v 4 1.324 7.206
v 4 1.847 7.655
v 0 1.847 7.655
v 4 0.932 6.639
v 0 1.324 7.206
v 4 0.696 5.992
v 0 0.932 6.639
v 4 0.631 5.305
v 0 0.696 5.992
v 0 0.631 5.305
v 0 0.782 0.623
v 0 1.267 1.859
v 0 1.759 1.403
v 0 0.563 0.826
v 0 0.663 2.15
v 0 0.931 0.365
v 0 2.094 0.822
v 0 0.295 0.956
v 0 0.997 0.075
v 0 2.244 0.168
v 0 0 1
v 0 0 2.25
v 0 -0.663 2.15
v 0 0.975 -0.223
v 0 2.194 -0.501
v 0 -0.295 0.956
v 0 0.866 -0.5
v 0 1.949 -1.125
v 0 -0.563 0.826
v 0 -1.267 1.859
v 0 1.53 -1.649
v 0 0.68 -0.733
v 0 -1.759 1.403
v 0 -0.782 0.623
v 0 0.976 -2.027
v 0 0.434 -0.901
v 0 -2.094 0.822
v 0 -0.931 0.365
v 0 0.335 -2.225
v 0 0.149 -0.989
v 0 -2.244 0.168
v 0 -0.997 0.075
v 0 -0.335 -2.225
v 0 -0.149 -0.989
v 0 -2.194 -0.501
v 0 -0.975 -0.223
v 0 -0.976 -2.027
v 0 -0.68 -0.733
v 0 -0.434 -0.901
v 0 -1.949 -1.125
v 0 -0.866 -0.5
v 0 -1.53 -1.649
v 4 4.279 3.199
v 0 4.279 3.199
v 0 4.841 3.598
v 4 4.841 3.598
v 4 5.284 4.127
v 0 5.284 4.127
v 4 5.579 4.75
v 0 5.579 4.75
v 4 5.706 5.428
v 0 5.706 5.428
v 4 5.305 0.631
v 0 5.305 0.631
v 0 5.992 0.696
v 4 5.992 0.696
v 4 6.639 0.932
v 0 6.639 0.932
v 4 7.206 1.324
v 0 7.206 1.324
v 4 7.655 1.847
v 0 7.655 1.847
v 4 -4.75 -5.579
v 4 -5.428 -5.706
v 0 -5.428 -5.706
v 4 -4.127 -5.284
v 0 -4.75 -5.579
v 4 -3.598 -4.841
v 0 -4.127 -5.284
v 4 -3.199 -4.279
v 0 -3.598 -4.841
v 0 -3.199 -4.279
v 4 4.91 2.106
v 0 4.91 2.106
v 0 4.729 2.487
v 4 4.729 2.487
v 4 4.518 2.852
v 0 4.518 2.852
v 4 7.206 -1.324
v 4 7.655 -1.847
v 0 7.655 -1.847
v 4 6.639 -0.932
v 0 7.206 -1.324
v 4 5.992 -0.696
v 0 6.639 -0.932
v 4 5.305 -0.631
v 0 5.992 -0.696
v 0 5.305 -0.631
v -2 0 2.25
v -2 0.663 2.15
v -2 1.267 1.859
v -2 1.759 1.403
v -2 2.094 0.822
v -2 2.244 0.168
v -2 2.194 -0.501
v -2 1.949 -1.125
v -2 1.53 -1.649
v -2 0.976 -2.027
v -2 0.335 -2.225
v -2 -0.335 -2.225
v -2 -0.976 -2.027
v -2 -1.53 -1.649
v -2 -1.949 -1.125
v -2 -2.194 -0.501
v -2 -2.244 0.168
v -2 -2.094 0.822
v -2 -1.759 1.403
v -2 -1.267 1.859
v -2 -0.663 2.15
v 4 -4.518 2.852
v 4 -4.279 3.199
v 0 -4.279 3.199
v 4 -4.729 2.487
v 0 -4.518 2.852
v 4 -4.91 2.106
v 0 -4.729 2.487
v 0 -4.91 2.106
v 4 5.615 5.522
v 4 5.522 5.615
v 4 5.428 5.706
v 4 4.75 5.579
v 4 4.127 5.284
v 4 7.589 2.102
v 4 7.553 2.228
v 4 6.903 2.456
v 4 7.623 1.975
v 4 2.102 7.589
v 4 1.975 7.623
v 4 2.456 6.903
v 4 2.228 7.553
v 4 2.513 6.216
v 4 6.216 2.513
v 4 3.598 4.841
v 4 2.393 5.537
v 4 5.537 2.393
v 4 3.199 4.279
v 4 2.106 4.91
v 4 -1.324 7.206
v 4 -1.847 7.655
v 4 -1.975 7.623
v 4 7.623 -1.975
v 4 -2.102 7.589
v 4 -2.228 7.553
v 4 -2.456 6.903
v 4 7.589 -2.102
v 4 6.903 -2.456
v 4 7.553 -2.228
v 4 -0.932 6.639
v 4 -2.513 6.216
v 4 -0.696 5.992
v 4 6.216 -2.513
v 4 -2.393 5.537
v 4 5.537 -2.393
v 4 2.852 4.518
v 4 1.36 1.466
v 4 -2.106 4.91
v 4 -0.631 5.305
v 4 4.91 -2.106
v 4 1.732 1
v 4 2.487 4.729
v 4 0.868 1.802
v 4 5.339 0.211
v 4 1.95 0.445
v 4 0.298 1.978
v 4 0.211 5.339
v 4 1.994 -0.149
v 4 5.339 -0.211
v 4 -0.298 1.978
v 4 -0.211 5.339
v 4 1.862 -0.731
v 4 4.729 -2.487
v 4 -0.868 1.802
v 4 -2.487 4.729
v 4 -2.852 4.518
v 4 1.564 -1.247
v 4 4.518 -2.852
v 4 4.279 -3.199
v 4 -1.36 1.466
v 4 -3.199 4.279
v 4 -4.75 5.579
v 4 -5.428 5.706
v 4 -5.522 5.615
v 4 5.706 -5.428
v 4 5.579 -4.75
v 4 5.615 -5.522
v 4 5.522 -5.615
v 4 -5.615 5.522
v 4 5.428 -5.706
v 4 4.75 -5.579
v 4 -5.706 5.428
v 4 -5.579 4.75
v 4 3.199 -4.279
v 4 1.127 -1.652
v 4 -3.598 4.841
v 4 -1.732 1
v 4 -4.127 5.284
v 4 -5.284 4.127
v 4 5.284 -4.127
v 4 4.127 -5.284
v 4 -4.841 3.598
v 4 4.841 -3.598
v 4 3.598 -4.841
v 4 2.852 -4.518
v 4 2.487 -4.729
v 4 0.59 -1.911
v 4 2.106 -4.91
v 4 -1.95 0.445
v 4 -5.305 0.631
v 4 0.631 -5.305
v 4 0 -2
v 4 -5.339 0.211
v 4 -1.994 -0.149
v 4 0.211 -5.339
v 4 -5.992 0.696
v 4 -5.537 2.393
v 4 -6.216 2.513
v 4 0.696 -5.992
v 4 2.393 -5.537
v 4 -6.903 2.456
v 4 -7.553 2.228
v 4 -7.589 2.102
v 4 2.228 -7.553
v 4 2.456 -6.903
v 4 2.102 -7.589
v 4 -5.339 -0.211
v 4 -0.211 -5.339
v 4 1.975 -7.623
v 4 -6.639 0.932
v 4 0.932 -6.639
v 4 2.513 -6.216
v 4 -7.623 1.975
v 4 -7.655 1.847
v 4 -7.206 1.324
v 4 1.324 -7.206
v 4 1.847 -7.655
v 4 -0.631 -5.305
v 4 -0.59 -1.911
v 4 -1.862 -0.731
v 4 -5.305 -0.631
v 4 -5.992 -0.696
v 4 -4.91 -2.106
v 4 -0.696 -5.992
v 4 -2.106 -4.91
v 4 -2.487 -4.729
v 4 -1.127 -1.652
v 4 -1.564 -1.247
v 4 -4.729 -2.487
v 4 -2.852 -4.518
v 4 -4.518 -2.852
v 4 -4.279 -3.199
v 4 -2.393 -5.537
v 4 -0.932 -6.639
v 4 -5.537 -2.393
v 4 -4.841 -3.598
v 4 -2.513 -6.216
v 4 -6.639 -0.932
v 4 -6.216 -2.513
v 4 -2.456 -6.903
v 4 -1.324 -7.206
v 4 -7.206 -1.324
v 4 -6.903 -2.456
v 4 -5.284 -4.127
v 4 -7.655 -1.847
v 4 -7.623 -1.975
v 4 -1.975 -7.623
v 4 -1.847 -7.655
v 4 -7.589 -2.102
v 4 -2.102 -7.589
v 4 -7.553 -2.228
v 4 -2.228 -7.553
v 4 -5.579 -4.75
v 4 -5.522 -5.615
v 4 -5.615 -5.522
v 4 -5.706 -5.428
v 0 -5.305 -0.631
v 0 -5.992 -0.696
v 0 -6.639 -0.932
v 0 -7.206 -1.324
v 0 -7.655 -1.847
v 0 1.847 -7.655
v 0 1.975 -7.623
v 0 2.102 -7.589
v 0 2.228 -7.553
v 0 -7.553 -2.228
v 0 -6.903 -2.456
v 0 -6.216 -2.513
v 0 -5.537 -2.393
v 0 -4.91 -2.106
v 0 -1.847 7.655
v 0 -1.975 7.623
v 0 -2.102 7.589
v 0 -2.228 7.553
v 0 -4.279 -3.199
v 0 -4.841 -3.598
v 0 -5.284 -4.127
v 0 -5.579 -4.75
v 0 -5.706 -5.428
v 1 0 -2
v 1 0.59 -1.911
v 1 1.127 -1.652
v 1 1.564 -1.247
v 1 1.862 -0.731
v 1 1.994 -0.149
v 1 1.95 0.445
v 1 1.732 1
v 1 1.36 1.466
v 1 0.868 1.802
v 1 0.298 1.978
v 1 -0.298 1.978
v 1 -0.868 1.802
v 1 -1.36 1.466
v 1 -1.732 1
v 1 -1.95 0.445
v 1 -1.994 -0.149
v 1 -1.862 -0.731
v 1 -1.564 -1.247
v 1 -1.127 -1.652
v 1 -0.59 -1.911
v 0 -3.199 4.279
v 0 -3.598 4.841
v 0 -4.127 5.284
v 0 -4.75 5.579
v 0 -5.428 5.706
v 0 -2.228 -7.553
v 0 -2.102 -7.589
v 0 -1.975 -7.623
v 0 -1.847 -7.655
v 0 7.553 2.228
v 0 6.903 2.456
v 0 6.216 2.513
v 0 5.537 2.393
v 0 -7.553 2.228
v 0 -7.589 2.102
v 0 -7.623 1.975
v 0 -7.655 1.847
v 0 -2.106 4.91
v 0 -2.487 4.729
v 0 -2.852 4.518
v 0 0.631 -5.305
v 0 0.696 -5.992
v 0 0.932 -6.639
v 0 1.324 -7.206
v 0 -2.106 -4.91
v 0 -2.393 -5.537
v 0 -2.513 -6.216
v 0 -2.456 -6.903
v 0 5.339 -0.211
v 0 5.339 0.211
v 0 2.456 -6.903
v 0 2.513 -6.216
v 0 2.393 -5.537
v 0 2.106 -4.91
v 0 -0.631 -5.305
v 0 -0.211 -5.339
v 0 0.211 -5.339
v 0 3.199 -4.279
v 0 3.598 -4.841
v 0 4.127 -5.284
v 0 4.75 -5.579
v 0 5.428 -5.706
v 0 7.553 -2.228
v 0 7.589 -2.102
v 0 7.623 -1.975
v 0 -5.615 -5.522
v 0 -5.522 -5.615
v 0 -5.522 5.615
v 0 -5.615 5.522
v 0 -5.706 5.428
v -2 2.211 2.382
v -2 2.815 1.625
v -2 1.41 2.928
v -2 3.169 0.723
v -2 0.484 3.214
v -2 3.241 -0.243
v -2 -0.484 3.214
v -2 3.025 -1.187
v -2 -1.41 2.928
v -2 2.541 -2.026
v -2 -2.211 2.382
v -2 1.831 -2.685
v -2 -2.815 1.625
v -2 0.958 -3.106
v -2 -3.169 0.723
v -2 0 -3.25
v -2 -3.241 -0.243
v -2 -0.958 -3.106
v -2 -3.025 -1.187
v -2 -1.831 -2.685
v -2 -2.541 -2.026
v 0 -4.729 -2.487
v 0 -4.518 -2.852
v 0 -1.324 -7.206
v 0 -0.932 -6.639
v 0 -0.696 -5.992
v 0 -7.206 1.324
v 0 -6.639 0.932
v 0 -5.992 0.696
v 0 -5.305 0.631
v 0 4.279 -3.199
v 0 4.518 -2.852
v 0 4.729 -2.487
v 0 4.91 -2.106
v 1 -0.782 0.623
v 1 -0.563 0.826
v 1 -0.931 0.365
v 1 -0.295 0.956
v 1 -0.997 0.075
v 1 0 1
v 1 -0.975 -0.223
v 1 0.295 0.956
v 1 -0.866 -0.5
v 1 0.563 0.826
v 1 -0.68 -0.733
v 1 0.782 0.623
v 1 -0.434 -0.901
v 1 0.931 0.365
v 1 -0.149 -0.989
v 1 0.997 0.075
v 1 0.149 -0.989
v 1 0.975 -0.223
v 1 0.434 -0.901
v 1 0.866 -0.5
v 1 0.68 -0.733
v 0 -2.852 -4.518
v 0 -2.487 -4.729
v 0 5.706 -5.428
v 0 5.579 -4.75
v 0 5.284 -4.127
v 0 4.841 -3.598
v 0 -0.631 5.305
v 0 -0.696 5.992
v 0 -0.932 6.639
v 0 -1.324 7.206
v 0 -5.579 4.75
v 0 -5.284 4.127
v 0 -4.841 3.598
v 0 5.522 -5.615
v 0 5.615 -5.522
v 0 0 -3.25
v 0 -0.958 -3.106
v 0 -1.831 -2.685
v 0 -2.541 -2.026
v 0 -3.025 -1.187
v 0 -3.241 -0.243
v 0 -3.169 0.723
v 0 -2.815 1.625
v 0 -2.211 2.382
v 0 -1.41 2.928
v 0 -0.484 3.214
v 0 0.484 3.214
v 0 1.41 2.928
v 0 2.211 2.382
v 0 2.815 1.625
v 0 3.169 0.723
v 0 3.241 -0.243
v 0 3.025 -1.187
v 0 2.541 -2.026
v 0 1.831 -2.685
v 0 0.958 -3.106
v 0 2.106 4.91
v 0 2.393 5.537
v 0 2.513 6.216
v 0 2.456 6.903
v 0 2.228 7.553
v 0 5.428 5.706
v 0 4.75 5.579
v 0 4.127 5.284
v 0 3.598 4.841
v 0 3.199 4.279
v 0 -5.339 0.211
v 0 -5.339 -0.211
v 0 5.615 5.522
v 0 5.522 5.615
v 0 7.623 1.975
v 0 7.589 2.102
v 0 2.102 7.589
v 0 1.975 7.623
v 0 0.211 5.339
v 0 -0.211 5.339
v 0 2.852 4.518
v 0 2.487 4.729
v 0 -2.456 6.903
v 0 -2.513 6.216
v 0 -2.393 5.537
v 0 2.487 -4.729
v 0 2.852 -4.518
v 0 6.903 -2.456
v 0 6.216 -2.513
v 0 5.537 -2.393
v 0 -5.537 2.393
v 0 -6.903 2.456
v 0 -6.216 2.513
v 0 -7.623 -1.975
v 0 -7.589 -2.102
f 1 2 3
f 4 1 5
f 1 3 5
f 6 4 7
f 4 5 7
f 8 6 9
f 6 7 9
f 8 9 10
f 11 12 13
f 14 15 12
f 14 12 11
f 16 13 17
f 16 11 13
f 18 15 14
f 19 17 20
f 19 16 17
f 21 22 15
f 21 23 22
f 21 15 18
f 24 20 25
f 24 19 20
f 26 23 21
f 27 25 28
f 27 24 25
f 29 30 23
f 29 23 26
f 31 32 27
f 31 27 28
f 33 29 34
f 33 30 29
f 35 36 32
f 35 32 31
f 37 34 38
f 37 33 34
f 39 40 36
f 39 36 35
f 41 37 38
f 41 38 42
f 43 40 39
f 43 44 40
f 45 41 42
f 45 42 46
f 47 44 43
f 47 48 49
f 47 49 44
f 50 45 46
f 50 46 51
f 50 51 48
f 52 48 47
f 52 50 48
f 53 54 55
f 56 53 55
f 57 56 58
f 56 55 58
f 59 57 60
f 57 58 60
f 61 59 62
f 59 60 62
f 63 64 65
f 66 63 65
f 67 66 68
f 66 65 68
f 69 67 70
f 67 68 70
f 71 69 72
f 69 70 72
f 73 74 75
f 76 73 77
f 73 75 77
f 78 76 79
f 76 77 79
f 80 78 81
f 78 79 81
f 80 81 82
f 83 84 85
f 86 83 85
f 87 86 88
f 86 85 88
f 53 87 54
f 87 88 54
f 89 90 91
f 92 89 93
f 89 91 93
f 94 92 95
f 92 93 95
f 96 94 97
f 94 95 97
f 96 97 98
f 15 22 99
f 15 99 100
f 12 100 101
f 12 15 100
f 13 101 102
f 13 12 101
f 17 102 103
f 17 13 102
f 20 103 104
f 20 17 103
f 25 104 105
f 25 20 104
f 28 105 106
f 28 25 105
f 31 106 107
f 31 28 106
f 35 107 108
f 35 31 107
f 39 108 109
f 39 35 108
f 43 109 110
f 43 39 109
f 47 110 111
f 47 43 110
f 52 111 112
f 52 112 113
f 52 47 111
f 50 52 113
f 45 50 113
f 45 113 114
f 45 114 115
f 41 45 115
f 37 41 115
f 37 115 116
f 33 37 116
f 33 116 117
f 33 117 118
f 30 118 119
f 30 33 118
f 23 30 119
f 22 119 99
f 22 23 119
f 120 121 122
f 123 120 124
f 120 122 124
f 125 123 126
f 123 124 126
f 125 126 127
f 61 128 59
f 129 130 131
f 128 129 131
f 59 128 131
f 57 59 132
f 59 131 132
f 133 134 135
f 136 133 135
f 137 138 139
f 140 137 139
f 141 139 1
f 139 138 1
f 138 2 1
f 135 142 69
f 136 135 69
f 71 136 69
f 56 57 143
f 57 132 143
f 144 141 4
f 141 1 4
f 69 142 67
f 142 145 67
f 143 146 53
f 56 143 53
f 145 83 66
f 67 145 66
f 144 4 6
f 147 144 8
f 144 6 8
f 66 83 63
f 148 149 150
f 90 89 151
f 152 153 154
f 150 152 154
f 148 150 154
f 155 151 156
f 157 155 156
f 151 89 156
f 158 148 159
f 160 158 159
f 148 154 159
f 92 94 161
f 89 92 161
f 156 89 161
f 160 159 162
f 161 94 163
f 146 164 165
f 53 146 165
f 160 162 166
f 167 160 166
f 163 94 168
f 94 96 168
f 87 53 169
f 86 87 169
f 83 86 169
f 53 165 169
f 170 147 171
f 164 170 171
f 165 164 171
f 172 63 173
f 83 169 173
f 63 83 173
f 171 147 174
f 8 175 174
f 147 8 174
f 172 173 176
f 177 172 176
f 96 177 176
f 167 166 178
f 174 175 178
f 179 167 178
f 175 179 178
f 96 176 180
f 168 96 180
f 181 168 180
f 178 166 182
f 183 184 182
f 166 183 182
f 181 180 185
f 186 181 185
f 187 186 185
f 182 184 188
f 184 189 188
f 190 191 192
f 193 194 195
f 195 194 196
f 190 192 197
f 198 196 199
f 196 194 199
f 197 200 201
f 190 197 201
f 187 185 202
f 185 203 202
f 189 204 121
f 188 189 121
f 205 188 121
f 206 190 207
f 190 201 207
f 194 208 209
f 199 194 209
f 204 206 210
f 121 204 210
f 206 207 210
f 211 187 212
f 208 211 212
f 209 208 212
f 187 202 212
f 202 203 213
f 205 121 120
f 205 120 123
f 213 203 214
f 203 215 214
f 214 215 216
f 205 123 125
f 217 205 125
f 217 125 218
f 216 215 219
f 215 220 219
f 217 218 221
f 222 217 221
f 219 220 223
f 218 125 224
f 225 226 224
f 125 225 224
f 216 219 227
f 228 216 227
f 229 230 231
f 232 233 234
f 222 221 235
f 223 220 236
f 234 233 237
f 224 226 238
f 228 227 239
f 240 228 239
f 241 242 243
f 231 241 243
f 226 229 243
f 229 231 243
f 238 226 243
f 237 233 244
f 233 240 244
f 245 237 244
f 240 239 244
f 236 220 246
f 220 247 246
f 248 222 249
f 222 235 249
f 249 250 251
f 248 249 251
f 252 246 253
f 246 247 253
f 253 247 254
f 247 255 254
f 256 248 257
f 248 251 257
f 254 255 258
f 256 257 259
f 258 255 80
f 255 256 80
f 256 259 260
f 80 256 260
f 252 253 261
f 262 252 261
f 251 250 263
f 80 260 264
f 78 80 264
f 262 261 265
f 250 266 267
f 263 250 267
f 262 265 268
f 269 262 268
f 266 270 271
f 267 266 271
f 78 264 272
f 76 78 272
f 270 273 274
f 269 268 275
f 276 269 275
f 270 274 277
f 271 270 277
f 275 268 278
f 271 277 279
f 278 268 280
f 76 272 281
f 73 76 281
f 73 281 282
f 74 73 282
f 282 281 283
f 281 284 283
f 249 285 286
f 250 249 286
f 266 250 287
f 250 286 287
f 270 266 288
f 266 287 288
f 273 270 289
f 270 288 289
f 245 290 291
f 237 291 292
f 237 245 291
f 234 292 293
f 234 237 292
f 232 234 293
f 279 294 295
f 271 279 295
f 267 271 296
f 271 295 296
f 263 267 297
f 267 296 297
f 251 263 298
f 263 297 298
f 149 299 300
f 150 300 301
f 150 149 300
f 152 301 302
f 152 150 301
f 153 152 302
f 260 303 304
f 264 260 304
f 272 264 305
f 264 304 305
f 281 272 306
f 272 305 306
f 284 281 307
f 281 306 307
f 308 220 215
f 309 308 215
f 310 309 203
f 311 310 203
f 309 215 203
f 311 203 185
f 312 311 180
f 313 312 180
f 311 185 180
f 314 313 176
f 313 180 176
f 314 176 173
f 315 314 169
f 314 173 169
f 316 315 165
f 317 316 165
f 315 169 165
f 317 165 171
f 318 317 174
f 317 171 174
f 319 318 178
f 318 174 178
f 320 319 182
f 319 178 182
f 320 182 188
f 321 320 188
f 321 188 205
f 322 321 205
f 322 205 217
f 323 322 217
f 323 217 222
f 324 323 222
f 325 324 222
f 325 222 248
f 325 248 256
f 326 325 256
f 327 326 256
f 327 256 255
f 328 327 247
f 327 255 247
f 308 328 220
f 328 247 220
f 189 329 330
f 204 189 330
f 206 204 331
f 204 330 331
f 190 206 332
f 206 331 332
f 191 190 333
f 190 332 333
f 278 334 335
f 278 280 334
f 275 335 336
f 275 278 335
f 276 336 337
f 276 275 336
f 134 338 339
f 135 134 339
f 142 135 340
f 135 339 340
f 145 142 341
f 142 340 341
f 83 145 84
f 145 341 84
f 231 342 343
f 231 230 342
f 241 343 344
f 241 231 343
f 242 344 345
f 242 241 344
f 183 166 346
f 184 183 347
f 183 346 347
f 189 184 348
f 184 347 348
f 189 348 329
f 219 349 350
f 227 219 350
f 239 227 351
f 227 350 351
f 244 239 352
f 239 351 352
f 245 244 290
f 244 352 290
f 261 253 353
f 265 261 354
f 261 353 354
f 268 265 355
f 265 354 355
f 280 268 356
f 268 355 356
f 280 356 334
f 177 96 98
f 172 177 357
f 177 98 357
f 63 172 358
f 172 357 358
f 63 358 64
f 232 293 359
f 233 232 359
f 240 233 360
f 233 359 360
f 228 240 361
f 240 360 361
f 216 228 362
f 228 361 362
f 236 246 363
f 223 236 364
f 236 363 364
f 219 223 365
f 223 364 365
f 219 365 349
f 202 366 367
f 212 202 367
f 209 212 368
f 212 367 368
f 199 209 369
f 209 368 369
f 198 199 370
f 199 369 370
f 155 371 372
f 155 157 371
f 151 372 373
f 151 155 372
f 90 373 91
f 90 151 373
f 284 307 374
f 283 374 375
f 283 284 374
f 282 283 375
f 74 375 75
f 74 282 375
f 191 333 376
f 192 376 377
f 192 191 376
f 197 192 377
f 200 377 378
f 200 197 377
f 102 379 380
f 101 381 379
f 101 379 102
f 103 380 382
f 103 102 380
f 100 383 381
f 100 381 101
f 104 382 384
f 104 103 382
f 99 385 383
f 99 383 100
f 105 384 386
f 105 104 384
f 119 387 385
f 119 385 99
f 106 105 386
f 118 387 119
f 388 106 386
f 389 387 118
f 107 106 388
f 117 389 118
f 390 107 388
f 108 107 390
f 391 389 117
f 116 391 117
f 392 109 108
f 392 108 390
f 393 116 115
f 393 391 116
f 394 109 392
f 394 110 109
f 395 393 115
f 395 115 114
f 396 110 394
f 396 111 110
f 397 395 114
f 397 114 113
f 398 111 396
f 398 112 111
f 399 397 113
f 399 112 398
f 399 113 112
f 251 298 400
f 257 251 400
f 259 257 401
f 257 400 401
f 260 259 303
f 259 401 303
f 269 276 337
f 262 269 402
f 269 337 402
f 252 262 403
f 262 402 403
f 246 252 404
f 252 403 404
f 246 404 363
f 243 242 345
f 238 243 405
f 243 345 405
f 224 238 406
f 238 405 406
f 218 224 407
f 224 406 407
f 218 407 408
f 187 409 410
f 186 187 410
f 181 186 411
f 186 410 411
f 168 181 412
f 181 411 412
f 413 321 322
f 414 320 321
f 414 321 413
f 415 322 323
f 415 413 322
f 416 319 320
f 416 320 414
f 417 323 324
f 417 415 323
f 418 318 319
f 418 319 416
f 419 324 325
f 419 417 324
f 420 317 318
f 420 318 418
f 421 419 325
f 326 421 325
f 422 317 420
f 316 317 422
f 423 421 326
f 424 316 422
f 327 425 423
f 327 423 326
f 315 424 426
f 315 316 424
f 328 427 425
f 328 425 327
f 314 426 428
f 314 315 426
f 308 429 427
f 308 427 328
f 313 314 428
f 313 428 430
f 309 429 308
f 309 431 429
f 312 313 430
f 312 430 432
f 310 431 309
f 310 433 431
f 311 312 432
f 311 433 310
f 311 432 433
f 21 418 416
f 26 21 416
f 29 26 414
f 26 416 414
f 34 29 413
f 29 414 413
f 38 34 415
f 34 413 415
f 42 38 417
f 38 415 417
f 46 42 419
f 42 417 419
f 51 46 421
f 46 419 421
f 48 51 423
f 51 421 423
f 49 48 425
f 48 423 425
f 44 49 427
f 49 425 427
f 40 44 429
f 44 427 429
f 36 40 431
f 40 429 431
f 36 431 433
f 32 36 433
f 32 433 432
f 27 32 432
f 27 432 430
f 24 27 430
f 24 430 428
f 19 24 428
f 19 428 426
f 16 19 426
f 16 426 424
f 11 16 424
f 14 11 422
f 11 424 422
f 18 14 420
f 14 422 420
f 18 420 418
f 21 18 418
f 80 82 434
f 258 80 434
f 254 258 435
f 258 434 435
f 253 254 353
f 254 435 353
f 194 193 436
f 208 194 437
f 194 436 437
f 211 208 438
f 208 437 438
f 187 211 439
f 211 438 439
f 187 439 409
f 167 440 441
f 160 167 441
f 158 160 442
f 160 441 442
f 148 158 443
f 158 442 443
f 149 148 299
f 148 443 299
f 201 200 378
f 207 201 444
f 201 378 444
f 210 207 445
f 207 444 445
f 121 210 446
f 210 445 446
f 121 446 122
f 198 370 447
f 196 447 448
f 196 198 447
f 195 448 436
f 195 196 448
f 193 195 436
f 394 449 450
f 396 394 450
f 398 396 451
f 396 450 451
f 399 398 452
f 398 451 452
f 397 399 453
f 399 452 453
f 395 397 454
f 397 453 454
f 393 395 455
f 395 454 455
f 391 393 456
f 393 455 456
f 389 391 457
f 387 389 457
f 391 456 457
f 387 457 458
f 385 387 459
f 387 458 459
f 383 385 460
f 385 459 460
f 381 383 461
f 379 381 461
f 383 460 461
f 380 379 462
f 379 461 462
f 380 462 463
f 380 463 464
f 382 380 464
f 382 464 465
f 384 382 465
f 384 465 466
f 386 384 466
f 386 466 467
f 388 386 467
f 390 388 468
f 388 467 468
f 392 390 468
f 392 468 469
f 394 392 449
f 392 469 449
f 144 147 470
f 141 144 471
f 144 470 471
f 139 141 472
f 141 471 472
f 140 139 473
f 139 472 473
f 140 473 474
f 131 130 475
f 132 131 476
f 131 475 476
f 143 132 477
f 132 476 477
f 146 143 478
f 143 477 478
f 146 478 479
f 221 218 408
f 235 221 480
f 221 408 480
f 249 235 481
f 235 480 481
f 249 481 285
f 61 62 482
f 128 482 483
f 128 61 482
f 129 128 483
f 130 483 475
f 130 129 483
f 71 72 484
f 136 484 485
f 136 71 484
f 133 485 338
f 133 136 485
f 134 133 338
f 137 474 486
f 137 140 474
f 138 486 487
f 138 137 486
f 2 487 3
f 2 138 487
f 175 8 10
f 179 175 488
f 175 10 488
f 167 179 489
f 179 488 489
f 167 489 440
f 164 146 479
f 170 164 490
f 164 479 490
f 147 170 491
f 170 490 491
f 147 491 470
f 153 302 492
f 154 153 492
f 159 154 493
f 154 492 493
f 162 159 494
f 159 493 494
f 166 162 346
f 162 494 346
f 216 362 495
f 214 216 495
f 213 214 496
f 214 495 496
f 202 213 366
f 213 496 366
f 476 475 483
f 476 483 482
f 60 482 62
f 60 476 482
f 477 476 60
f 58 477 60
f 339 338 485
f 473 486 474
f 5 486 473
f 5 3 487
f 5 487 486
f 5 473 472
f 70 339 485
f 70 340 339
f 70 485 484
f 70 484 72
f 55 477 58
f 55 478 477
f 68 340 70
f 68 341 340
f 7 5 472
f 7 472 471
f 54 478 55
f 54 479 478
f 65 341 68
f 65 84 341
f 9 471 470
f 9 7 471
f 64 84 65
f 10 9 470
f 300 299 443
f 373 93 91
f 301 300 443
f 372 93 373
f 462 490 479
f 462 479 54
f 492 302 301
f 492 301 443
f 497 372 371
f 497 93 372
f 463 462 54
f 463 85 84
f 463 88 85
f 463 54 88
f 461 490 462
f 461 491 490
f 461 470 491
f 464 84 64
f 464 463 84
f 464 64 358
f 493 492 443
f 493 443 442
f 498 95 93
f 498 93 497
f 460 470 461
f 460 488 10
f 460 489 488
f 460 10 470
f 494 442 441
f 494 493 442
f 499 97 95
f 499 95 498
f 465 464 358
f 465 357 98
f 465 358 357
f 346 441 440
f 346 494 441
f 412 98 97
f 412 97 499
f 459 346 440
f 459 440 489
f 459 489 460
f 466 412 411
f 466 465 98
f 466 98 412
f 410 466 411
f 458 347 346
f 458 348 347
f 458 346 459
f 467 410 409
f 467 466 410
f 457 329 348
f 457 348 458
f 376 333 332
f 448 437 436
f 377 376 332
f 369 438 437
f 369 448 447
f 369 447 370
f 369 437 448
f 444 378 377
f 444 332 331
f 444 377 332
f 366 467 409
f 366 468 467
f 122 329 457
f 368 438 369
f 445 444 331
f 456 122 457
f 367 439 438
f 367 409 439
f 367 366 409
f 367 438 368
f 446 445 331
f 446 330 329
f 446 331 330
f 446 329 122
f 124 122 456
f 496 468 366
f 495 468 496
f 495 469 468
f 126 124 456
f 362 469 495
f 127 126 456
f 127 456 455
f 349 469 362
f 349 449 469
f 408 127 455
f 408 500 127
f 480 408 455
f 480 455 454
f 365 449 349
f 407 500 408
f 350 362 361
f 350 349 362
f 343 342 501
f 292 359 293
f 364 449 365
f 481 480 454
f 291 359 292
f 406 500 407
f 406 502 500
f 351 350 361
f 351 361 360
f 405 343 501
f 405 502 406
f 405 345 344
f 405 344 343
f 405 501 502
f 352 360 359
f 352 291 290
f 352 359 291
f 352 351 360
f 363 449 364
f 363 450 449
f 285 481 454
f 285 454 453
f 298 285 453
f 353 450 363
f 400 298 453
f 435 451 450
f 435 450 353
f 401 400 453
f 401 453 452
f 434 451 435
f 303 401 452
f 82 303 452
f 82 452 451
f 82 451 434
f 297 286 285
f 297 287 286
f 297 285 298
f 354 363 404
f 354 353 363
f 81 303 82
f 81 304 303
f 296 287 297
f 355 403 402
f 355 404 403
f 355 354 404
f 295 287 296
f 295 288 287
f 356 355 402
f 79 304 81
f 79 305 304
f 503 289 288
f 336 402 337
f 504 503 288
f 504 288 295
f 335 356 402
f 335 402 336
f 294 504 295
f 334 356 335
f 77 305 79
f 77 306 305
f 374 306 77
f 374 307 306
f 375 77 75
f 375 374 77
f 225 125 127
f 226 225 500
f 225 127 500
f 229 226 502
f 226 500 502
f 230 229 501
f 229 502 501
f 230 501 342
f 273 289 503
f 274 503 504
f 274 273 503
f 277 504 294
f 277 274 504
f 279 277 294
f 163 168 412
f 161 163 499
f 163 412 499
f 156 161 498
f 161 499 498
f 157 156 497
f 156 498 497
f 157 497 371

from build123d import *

# Parameters (mm, degrees)
BASPROSKE_W         = 4
BASPROSKE_H         = 7.875
TOOTHCUT_DEPTH      = 12.833480046
TEETHCUTS_COUNT     = 12
TEETHCUTS_ANGLE     = 330
BORSKE_R            = 1
BORE_DEPTH          = 50.0000508
SKETCH1_R           = 3.25
SKETCH1_R_2         = 2.25
BOSS_EXTRUDE1_DEPTH = 2
SKETCH2_R           = 2
CUT_EXTRUDE1_DEPTH  = 3


with BuildPart() as part:
    # BasProSke → Base-Revolve (revolve)
    with BuildSketch(Plane(origin=(0, 0, 0), x_dir=(1, 0, 0), z_dir=(0, 1, 0)), mode=Mode.PRIVATE) as base_revolve_sk:
        with Locations((2, 3.9375)):
            Rectangle(BASPROSKE_W, BASPROSKE_H)
    revolve(base_revolve_sk.sketch.rotate(Axis((-10, 0, 0), (1, 0, 0)), 180), axis=Axis((-10, 0, 0), (1, 0, 0)))

    # TooCutSke → ToothCut (cut, through all)
    with BuildSketch(Plane(origin=(0, 0, 0), x_dir=(0, 0, -1), z_dir=(1, 0, 0))):
        with BuildLine():
            ThreePointArc((0.631439839, 5.305305014), (0, 5.34275), (-0.631439839, 5.305305014))
            ThreePointArc((-0.631439839, 5.305305014), (-0.93992237, 6.654932089), (-1.876748184, 7.674251521))
            ThreePointArc((-1.876748184, 7.674251521), (0, 7.9004), (1.876748184, 7.674251521))
            ThreePointArc((1.876748184, 7.674251521), (0.93992237, 6.654932089), (0.631439839, 5.305305014))
        make_face()
    toothcut = extrude(amount=TOOTHCUT_DEPTH, mode=Mode.SUBTRACT)

    # TeethCuts: ToothCut ×12 about axis
    teethcuts_axis = Axis((-10, 0, 0), (1, 0, 0))
    for i in range(1, TEETHCUTS_COUNT):
        add(toothcut.rotate(teethcuts_axis, i * TEETHCUTS_ANGLE / (TEETHCUTS_COUNT - 1)), mode=Mode.SUBTRACT)

    # BorSke → Bore (cut, symmetric)
    with BuildSketch(Plane(origin=(0, 0, 0), x_dir=(0, 0, -1), z_dir=(1, 0, 0))):
        with Locations(Location((0, 0, 0), (0, 0, 180))):
            Circle(BORSKE_R)
    extrude(amount=BORE_DEPTH, both=True, mode=Mode.SUBTRACT)

    # Sketch1 → Boss-Extrude1 (add)
    with BuildSketch(Plane.ZY):
        with Locations(Location((0, 0, 0), (0, 0, 180))):
            Circle(SKETCH1_R)
        Circle(SKETCH1_R_2, mode=Mode.SUBTRACT)
    extrude(amount=BOSS_EXTRUDE1_DEPTH)

    # Sketch2 → Cut-Extrude1 (cut)
    with BuildSketch(Plane(origin=(4, 0, 0), x_dir=(0, 0, -1), z_dir=(1, 0, 0))):
        Circle(SKETCH2_R)
    extrude(amount=-CUT_EXTRUDE1_DEPTH, mode=Mode.SUBTRACT)


solid = part.part
